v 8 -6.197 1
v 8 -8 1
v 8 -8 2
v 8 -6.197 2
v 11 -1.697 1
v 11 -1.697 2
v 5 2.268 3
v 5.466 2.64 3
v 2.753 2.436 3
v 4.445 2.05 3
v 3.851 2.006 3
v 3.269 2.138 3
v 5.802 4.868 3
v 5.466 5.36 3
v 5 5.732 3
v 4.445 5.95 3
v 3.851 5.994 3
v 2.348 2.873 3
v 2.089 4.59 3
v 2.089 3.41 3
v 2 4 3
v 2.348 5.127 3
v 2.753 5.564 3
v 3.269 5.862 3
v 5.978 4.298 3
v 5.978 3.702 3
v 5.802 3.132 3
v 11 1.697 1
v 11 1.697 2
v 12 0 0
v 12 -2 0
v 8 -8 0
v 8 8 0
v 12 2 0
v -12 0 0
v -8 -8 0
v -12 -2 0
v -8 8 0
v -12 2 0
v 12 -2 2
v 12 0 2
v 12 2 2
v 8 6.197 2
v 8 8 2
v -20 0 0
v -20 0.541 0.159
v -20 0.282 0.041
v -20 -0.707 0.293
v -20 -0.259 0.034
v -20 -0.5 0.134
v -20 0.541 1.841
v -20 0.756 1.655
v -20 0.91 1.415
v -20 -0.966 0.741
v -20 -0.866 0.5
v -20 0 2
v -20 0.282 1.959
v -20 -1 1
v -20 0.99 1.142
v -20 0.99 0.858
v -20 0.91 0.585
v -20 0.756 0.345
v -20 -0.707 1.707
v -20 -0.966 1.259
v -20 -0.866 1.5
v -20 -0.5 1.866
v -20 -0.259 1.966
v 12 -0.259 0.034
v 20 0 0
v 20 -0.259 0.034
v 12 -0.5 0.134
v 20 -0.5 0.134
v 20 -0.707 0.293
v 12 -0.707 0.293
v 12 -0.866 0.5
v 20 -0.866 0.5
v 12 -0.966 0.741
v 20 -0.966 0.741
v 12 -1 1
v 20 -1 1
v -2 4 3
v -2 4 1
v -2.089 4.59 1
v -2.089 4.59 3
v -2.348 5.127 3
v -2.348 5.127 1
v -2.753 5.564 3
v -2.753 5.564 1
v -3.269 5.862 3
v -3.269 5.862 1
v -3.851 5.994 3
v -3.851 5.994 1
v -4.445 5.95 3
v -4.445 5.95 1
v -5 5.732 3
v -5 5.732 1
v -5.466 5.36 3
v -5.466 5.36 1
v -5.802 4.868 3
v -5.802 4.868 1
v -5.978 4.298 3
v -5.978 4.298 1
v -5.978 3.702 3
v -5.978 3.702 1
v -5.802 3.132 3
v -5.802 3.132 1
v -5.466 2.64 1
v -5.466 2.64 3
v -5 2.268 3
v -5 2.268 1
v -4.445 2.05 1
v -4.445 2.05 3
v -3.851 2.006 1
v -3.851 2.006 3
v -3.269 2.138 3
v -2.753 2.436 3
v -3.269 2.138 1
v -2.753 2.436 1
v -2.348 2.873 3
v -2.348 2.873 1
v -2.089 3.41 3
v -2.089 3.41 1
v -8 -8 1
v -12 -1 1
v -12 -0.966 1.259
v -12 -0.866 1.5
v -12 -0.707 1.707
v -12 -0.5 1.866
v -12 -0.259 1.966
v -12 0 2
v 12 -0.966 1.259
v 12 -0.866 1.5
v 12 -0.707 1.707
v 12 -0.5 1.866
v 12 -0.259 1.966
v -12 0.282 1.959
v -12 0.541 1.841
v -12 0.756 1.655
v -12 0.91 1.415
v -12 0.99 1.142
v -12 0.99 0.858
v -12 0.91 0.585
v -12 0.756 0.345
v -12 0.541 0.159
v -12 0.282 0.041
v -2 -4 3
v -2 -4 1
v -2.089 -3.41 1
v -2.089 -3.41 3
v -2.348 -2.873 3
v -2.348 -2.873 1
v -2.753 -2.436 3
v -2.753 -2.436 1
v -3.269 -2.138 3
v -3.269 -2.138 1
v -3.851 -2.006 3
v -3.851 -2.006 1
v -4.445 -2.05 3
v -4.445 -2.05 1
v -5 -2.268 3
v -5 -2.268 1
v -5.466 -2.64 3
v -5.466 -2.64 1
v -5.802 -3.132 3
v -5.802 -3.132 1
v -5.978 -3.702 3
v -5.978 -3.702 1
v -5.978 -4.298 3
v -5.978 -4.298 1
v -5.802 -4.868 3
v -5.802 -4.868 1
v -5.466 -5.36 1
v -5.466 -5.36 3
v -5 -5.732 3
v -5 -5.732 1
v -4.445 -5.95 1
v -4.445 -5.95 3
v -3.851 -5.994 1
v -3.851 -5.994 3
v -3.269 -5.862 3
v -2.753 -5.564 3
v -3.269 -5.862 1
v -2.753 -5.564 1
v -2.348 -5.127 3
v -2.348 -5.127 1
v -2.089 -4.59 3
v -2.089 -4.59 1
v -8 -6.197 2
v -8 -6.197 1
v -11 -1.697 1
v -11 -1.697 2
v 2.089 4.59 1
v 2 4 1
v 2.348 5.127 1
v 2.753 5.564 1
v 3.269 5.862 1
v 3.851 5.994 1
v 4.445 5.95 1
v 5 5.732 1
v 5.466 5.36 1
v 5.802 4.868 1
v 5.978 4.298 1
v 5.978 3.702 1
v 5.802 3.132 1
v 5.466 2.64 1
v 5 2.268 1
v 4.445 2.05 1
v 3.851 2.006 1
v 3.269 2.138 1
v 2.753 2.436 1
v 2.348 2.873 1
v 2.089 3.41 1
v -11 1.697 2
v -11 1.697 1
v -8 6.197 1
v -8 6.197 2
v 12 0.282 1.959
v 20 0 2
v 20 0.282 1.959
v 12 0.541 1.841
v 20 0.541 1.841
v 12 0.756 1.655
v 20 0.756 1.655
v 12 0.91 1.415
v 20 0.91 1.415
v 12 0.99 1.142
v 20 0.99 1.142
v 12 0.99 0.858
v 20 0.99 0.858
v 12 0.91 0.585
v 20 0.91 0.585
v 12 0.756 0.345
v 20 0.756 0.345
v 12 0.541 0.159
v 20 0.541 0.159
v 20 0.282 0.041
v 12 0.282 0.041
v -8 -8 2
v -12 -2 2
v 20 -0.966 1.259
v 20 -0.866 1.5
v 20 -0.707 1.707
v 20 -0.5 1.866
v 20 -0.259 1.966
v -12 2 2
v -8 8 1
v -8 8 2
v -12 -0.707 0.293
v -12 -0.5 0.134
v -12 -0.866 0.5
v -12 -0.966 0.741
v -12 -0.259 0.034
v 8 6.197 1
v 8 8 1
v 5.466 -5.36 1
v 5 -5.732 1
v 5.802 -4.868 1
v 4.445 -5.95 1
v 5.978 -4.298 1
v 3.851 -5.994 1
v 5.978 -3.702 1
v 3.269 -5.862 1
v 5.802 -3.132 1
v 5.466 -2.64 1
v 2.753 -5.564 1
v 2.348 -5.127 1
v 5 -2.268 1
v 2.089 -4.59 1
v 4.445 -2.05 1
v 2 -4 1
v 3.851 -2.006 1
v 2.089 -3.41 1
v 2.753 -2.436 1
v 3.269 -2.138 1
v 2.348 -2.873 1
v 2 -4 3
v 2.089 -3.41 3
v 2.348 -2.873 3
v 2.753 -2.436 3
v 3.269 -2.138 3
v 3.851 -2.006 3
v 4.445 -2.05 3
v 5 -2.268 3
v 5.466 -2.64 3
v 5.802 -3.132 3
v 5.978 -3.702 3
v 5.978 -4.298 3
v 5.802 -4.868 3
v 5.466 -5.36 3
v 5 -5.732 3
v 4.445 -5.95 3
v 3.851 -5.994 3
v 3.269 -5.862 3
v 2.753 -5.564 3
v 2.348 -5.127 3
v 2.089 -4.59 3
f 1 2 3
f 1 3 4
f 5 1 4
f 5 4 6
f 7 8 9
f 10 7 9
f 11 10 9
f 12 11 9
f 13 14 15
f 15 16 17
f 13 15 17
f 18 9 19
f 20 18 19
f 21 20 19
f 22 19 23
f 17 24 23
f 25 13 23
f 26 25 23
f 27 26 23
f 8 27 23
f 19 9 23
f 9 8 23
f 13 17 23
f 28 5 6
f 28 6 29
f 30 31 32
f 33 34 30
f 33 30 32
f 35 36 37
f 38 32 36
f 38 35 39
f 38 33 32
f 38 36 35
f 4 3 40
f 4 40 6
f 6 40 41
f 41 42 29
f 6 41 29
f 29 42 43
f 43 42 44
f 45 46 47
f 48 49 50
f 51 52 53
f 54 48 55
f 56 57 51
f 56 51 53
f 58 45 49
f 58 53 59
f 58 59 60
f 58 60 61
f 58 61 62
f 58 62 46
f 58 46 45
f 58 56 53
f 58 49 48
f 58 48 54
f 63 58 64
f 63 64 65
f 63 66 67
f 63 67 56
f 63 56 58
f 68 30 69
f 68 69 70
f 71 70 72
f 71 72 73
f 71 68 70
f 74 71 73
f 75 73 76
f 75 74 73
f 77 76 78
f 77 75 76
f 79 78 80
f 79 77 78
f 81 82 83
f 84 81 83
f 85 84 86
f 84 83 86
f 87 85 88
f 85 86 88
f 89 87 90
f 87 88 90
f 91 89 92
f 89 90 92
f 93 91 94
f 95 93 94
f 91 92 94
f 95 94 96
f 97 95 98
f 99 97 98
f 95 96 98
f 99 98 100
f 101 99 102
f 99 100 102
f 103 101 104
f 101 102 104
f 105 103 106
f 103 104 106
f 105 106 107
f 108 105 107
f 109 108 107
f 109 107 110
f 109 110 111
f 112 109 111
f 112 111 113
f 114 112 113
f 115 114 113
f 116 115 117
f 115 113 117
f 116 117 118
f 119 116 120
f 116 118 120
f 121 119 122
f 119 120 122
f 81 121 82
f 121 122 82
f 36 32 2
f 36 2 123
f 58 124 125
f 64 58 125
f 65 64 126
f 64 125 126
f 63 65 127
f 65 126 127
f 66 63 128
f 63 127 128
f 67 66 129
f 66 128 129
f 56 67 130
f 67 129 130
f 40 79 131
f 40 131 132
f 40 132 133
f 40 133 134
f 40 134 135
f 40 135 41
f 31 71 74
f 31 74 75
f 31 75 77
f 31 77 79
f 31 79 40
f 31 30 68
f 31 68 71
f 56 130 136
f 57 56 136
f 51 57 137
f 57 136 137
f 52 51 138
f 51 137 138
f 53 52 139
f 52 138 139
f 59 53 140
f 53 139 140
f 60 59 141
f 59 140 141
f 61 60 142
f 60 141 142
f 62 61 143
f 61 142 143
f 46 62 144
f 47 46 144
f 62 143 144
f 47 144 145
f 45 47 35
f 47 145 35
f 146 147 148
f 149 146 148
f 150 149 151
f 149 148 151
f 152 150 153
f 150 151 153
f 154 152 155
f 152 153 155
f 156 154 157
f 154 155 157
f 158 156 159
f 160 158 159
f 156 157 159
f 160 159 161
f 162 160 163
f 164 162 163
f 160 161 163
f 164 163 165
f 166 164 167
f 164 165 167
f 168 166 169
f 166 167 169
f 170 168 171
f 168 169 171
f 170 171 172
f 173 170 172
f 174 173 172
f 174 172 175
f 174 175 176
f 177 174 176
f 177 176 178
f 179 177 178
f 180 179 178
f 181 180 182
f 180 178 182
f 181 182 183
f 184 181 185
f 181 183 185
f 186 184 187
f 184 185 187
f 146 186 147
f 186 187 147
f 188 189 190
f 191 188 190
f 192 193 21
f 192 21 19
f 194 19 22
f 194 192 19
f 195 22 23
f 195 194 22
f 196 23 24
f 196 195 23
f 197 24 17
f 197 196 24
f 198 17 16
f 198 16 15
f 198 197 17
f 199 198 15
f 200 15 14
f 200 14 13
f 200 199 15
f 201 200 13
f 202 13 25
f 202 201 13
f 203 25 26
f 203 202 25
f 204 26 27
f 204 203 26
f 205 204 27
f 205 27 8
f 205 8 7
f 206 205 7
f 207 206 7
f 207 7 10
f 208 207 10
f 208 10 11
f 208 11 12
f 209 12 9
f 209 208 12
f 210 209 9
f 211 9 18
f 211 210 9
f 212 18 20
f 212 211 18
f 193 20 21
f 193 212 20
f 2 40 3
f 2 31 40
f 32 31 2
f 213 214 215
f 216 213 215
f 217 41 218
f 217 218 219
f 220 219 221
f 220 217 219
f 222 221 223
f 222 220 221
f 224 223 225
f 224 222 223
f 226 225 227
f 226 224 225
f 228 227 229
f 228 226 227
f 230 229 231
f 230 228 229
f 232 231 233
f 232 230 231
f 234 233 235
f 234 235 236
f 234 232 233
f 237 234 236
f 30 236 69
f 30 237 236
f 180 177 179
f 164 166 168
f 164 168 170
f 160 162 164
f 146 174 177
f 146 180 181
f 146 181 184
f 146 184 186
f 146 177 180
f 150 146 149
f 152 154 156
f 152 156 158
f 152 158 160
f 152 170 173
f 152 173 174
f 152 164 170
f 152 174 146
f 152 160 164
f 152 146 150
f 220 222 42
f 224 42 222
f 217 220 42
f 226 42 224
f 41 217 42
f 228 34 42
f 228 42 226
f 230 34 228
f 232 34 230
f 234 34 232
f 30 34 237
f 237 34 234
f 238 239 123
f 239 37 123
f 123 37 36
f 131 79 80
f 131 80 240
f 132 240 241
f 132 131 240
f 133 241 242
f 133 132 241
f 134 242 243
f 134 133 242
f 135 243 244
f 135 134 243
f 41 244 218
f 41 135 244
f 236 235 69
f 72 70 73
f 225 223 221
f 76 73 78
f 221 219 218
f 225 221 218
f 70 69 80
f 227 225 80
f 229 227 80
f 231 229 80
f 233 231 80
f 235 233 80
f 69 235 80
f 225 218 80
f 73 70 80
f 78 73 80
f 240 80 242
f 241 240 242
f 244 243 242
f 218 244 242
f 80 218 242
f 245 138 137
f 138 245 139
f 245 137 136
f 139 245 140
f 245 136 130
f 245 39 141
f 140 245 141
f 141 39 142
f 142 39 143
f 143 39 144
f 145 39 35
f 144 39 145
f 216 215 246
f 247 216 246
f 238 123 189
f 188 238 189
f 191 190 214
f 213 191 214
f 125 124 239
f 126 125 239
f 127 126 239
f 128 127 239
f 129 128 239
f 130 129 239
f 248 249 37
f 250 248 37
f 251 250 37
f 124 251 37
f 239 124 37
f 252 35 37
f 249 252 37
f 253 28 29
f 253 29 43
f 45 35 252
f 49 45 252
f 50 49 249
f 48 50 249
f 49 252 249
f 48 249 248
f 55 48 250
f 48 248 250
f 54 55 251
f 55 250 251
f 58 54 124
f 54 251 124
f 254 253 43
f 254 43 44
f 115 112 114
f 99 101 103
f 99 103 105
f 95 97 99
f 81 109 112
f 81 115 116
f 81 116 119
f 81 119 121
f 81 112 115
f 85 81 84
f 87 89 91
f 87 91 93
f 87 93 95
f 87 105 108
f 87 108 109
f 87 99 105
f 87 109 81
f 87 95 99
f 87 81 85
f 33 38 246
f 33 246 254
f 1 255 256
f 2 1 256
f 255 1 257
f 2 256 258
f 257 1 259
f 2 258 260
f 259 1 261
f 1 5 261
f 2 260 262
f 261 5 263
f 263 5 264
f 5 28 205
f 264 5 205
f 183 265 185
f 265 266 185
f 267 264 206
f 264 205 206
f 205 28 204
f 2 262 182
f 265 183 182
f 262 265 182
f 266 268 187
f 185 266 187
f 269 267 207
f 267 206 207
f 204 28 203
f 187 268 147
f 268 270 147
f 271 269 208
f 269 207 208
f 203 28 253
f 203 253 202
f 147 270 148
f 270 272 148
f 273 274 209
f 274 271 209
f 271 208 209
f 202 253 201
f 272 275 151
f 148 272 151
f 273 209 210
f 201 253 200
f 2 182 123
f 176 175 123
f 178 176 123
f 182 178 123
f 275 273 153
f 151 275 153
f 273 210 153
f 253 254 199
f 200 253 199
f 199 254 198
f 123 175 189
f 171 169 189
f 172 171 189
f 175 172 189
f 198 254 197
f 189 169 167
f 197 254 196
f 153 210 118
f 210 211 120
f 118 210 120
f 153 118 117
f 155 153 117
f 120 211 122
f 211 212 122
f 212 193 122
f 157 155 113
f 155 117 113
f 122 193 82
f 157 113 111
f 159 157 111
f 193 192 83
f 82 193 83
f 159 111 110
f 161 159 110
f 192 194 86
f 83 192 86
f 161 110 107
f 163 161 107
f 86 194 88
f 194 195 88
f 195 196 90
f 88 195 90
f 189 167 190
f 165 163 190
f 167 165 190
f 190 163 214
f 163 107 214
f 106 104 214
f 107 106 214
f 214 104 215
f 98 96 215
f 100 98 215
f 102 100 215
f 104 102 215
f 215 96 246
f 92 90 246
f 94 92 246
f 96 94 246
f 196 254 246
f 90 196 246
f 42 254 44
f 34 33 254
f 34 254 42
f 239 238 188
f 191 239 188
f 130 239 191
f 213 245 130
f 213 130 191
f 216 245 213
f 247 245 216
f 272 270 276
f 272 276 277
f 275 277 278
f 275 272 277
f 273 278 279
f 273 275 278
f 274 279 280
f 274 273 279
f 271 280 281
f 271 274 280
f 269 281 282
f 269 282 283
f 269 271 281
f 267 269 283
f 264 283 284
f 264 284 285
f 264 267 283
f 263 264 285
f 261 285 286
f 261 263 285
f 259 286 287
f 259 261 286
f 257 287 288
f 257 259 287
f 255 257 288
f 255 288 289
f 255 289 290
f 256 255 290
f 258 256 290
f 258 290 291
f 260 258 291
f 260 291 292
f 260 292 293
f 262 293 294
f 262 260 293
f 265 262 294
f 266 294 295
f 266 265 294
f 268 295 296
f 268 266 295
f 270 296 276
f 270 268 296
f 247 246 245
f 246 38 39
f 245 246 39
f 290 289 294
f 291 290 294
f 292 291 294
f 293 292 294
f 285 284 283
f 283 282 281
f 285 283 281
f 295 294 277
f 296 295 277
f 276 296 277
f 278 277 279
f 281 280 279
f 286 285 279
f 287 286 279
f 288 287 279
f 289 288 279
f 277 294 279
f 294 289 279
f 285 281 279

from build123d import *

# Parameters (mm, degrees)
F1_DEPTH = 1
F2_R     = 2
F3_DEPTH = 2
F5_DEPTH = 1
F8_DEPTH = 8


with BuildPart() as f1:
    # F0 (on Top) → F1 (new body)
    with BuildSketch(Plane.XY):
        Polygon((0, -8), (0, 0), (-12, 0), (-12, -2), (-8, -8), align=None)
        Polygon((-12, 0), (0, 0), (0, 8), (-8, 8), (-12, 2), align=None)
    extrude(amount=F1_DEPTH)

    # F2 (on face) → F3 (join)
    with BuildSketch(Plane.XY.offset(1)):
        with Locations((-4, 4)):
            Circle(F2_R)
        with Locations((-4, -4)):
            Circle(F2_R)
    extrude(amount=F3_DEPTH)


with BuildPart() as f5:
    # F4 (on face) → F5 (new body)
    with BuildSketch(Plane.XY.offset(1)):
        Polygon((-8, 6.197224), (-8, 8), (-12, 2), (-12, -2), (-8, -8), (-8, -6.197224), (-11, -1.697224), (-11, 1.697224), align=None)
    extrude(amount=F5_DEPTH)


with BuildPart() as f1_1:
    add(f1.part)

    # F6: union F5
    add(f5.part)

    # F7 (on face) → F8 (join)
    with BuildSketch(Plane(origin=(-12, 0, 0), x_dir=(0, -1, 0), z_dir=(-1, 0, 0))):
        with BuildLine():
            ThreePointArc((0, 0), (0.707107, 0.292893), (1, 1))
            ThreePointArc((1, 1), (0.707107, 1.707107), (0, 2))
            ThreePointArc((0, 2), (-1, 1), (0, 0))
        make_face()
    extrude(amount=F8_DEPTH)

    # F9: F1 across face


with BuildPart() as f1_2:
    add(f1_1.part)
    add(f1_1.part.mirror(Plane(origin=(0, 0, 0.5), x_dir=(0, 1, 0), z_dir=(1, 0, 0))))


solid = f1_2.part
